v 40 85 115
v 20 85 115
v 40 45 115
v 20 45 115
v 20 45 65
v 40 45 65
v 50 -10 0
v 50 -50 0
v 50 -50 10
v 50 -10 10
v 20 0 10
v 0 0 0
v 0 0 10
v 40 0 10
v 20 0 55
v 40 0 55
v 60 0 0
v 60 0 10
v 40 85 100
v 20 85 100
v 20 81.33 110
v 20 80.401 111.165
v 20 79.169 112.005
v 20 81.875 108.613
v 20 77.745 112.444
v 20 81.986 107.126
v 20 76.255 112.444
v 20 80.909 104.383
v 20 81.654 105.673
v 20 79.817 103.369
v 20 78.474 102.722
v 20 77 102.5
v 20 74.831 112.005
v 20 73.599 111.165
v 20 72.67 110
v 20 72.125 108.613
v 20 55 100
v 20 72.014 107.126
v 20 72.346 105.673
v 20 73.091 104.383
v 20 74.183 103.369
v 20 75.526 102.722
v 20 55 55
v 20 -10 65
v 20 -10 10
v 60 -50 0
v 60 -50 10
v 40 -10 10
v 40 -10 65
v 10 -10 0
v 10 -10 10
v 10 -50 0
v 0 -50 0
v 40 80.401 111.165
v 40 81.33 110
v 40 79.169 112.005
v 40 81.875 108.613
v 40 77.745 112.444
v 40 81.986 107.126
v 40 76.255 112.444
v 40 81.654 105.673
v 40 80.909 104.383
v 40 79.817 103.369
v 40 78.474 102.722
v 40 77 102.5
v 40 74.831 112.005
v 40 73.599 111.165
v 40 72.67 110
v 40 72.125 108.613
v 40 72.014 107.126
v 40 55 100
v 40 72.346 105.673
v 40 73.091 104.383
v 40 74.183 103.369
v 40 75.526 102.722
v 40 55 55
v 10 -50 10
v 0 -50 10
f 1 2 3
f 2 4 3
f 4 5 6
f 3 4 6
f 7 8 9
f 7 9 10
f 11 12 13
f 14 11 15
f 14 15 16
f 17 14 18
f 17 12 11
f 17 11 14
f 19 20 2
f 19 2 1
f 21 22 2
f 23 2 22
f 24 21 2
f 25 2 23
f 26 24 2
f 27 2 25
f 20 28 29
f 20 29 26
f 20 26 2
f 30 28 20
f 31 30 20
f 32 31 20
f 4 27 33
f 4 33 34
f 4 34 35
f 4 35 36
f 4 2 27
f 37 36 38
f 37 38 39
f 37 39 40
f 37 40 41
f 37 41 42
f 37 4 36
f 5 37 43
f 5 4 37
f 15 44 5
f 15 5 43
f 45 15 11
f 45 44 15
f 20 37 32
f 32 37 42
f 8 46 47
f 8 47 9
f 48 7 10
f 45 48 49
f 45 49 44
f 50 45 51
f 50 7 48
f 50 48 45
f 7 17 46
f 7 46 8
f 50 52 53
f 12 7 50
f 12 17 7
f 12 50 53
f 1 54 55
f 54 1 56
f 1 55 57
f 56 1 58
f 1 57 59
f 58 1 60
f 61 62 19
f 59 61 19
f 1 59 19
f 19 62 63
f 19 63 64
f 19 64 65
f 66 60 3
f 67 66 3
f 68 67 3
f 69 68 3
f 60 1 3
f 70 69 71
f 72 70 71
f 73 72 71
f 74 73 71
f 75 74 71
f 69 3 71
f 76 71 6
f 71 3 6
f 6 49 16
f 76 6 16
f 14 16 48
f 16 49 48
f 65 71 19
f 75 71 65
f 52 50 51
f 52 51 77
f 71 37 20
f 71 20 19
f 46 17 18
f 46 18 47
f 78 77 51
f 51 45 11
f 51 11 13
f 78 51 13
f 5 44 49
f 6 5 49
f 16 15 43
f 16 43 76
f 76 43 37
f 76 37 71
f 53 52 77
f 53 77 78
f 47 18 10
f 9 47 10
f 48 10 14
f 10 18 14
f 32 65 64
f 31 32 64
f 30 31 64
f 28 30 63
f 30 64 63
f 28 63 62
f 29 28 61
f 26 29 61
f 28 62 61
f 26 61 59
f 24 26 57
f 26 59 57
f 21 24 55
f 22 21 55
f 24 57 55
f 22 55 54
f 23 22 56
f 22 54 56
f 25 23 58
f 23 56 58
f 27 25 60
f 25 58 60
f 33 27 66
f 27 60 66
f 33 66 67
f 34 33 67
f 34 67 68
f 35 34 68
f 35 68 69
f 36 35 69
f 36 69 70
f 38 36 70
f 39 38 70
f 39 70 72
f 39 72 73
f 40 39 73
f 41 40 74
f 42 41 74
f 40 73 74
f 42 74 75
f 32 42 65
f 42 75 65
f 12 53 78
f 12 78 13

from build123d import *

# Parameters (mm, degrees)
P_IDAT_VYSUNUT_M1_DEPTH  = 10
SKICA2_W                 = 20
SKICA2_H                 = 10
P_IDAT_VYSUNUT_M2_DEPTH  = 55
SKICA4_W                 = 20
SKICA4_H                 = 10
P_IDAT_VYSUNUT_M3_DEPTH  = 55
SKICA5_W                 = 20
SKICA5_H                 = 10
P_IDAT_VYSUNUT_M4_DEPTH  = 50
SKICA6_W                 = 20
SKICA6_H                 = 15
P_IDAT_VYSUNUT_M5_DEPTH  = 30
SKICA7_R                 = 5
ODEBRAT_VYSUNUT_M1_DEPTH = 20


with BuildPart() as part:
    # Skica1 → Přidat vysunutím1 (new body)
    with BuildSketch(Plane.XY):
        Polygon((0, 0), (60, 0), (60, -50), (50, -50), (50, -10), (10, -10), (10, -50), (0, -50), align=None)
    extrude(amount=P_IDAT_VYSUNUT_M1_DEPTH)

    # Skica2 → Přidat vysunutím2 (add)
    with BuildSketch(Plane.XY.offset(10)):
        with Locations((30, -5)):
            Rectangle(SKICA2_W, SKICA2_H)
    extrude(amount=P_IDAT_VYSUNUT_M2_DEPTH)

    # Skica4 → Přidat vysunutím3 (add)
    with BuildSketch(Plane(origin=(0, 0, 0), x_dir=(1, 0, 0), z_dir=(0, 1, 0))):
        with Locations((30, -60)):
            Rectangle(SKICA4_W, SKICA4_H)
    extrude(amount=P_IDAT_VYSUNUT_M3_DEPTH)

    # Skica5 → Přidat vysunutím4 (add)
    with BuildSketch(Plane.XY.offset(65)):
        with Locations((30, 50)):
            Rectangle(SKICA5_W, SKICA5_H)
    extrude(amount=P_IDAT_VYSUNUT_M4_DEPTH)

    # Skica6 → Přidat vysunutím5 (add)
    with BuildSketch(Plane(origin=(0, 55, 0), x_dir=(1, 0, 0), z_dir=(0, 1, 0))):
        with Locations((30, -107.5)):
            Rectangle(SKICA6_W, SKICA6_H)
    extrude(amount=P_IDAT_VYSUNUT_M5_DEPTH)

    # Skica7 → Odebrat vysunutím1 (cut)
    with BuildSketch(Plane(origin=(40, 0, 0), x_dir=(0, 0, -1), z_dir=(1, 0, 0))):
        with Locations((-107.5, 77)):
            Circle(SKICA7_R)
    extrude(amount=-ODEBRAT_VYSUNUT_M1_DEPTH, mode=Mode.SUBTRACT)


solid = part.part
